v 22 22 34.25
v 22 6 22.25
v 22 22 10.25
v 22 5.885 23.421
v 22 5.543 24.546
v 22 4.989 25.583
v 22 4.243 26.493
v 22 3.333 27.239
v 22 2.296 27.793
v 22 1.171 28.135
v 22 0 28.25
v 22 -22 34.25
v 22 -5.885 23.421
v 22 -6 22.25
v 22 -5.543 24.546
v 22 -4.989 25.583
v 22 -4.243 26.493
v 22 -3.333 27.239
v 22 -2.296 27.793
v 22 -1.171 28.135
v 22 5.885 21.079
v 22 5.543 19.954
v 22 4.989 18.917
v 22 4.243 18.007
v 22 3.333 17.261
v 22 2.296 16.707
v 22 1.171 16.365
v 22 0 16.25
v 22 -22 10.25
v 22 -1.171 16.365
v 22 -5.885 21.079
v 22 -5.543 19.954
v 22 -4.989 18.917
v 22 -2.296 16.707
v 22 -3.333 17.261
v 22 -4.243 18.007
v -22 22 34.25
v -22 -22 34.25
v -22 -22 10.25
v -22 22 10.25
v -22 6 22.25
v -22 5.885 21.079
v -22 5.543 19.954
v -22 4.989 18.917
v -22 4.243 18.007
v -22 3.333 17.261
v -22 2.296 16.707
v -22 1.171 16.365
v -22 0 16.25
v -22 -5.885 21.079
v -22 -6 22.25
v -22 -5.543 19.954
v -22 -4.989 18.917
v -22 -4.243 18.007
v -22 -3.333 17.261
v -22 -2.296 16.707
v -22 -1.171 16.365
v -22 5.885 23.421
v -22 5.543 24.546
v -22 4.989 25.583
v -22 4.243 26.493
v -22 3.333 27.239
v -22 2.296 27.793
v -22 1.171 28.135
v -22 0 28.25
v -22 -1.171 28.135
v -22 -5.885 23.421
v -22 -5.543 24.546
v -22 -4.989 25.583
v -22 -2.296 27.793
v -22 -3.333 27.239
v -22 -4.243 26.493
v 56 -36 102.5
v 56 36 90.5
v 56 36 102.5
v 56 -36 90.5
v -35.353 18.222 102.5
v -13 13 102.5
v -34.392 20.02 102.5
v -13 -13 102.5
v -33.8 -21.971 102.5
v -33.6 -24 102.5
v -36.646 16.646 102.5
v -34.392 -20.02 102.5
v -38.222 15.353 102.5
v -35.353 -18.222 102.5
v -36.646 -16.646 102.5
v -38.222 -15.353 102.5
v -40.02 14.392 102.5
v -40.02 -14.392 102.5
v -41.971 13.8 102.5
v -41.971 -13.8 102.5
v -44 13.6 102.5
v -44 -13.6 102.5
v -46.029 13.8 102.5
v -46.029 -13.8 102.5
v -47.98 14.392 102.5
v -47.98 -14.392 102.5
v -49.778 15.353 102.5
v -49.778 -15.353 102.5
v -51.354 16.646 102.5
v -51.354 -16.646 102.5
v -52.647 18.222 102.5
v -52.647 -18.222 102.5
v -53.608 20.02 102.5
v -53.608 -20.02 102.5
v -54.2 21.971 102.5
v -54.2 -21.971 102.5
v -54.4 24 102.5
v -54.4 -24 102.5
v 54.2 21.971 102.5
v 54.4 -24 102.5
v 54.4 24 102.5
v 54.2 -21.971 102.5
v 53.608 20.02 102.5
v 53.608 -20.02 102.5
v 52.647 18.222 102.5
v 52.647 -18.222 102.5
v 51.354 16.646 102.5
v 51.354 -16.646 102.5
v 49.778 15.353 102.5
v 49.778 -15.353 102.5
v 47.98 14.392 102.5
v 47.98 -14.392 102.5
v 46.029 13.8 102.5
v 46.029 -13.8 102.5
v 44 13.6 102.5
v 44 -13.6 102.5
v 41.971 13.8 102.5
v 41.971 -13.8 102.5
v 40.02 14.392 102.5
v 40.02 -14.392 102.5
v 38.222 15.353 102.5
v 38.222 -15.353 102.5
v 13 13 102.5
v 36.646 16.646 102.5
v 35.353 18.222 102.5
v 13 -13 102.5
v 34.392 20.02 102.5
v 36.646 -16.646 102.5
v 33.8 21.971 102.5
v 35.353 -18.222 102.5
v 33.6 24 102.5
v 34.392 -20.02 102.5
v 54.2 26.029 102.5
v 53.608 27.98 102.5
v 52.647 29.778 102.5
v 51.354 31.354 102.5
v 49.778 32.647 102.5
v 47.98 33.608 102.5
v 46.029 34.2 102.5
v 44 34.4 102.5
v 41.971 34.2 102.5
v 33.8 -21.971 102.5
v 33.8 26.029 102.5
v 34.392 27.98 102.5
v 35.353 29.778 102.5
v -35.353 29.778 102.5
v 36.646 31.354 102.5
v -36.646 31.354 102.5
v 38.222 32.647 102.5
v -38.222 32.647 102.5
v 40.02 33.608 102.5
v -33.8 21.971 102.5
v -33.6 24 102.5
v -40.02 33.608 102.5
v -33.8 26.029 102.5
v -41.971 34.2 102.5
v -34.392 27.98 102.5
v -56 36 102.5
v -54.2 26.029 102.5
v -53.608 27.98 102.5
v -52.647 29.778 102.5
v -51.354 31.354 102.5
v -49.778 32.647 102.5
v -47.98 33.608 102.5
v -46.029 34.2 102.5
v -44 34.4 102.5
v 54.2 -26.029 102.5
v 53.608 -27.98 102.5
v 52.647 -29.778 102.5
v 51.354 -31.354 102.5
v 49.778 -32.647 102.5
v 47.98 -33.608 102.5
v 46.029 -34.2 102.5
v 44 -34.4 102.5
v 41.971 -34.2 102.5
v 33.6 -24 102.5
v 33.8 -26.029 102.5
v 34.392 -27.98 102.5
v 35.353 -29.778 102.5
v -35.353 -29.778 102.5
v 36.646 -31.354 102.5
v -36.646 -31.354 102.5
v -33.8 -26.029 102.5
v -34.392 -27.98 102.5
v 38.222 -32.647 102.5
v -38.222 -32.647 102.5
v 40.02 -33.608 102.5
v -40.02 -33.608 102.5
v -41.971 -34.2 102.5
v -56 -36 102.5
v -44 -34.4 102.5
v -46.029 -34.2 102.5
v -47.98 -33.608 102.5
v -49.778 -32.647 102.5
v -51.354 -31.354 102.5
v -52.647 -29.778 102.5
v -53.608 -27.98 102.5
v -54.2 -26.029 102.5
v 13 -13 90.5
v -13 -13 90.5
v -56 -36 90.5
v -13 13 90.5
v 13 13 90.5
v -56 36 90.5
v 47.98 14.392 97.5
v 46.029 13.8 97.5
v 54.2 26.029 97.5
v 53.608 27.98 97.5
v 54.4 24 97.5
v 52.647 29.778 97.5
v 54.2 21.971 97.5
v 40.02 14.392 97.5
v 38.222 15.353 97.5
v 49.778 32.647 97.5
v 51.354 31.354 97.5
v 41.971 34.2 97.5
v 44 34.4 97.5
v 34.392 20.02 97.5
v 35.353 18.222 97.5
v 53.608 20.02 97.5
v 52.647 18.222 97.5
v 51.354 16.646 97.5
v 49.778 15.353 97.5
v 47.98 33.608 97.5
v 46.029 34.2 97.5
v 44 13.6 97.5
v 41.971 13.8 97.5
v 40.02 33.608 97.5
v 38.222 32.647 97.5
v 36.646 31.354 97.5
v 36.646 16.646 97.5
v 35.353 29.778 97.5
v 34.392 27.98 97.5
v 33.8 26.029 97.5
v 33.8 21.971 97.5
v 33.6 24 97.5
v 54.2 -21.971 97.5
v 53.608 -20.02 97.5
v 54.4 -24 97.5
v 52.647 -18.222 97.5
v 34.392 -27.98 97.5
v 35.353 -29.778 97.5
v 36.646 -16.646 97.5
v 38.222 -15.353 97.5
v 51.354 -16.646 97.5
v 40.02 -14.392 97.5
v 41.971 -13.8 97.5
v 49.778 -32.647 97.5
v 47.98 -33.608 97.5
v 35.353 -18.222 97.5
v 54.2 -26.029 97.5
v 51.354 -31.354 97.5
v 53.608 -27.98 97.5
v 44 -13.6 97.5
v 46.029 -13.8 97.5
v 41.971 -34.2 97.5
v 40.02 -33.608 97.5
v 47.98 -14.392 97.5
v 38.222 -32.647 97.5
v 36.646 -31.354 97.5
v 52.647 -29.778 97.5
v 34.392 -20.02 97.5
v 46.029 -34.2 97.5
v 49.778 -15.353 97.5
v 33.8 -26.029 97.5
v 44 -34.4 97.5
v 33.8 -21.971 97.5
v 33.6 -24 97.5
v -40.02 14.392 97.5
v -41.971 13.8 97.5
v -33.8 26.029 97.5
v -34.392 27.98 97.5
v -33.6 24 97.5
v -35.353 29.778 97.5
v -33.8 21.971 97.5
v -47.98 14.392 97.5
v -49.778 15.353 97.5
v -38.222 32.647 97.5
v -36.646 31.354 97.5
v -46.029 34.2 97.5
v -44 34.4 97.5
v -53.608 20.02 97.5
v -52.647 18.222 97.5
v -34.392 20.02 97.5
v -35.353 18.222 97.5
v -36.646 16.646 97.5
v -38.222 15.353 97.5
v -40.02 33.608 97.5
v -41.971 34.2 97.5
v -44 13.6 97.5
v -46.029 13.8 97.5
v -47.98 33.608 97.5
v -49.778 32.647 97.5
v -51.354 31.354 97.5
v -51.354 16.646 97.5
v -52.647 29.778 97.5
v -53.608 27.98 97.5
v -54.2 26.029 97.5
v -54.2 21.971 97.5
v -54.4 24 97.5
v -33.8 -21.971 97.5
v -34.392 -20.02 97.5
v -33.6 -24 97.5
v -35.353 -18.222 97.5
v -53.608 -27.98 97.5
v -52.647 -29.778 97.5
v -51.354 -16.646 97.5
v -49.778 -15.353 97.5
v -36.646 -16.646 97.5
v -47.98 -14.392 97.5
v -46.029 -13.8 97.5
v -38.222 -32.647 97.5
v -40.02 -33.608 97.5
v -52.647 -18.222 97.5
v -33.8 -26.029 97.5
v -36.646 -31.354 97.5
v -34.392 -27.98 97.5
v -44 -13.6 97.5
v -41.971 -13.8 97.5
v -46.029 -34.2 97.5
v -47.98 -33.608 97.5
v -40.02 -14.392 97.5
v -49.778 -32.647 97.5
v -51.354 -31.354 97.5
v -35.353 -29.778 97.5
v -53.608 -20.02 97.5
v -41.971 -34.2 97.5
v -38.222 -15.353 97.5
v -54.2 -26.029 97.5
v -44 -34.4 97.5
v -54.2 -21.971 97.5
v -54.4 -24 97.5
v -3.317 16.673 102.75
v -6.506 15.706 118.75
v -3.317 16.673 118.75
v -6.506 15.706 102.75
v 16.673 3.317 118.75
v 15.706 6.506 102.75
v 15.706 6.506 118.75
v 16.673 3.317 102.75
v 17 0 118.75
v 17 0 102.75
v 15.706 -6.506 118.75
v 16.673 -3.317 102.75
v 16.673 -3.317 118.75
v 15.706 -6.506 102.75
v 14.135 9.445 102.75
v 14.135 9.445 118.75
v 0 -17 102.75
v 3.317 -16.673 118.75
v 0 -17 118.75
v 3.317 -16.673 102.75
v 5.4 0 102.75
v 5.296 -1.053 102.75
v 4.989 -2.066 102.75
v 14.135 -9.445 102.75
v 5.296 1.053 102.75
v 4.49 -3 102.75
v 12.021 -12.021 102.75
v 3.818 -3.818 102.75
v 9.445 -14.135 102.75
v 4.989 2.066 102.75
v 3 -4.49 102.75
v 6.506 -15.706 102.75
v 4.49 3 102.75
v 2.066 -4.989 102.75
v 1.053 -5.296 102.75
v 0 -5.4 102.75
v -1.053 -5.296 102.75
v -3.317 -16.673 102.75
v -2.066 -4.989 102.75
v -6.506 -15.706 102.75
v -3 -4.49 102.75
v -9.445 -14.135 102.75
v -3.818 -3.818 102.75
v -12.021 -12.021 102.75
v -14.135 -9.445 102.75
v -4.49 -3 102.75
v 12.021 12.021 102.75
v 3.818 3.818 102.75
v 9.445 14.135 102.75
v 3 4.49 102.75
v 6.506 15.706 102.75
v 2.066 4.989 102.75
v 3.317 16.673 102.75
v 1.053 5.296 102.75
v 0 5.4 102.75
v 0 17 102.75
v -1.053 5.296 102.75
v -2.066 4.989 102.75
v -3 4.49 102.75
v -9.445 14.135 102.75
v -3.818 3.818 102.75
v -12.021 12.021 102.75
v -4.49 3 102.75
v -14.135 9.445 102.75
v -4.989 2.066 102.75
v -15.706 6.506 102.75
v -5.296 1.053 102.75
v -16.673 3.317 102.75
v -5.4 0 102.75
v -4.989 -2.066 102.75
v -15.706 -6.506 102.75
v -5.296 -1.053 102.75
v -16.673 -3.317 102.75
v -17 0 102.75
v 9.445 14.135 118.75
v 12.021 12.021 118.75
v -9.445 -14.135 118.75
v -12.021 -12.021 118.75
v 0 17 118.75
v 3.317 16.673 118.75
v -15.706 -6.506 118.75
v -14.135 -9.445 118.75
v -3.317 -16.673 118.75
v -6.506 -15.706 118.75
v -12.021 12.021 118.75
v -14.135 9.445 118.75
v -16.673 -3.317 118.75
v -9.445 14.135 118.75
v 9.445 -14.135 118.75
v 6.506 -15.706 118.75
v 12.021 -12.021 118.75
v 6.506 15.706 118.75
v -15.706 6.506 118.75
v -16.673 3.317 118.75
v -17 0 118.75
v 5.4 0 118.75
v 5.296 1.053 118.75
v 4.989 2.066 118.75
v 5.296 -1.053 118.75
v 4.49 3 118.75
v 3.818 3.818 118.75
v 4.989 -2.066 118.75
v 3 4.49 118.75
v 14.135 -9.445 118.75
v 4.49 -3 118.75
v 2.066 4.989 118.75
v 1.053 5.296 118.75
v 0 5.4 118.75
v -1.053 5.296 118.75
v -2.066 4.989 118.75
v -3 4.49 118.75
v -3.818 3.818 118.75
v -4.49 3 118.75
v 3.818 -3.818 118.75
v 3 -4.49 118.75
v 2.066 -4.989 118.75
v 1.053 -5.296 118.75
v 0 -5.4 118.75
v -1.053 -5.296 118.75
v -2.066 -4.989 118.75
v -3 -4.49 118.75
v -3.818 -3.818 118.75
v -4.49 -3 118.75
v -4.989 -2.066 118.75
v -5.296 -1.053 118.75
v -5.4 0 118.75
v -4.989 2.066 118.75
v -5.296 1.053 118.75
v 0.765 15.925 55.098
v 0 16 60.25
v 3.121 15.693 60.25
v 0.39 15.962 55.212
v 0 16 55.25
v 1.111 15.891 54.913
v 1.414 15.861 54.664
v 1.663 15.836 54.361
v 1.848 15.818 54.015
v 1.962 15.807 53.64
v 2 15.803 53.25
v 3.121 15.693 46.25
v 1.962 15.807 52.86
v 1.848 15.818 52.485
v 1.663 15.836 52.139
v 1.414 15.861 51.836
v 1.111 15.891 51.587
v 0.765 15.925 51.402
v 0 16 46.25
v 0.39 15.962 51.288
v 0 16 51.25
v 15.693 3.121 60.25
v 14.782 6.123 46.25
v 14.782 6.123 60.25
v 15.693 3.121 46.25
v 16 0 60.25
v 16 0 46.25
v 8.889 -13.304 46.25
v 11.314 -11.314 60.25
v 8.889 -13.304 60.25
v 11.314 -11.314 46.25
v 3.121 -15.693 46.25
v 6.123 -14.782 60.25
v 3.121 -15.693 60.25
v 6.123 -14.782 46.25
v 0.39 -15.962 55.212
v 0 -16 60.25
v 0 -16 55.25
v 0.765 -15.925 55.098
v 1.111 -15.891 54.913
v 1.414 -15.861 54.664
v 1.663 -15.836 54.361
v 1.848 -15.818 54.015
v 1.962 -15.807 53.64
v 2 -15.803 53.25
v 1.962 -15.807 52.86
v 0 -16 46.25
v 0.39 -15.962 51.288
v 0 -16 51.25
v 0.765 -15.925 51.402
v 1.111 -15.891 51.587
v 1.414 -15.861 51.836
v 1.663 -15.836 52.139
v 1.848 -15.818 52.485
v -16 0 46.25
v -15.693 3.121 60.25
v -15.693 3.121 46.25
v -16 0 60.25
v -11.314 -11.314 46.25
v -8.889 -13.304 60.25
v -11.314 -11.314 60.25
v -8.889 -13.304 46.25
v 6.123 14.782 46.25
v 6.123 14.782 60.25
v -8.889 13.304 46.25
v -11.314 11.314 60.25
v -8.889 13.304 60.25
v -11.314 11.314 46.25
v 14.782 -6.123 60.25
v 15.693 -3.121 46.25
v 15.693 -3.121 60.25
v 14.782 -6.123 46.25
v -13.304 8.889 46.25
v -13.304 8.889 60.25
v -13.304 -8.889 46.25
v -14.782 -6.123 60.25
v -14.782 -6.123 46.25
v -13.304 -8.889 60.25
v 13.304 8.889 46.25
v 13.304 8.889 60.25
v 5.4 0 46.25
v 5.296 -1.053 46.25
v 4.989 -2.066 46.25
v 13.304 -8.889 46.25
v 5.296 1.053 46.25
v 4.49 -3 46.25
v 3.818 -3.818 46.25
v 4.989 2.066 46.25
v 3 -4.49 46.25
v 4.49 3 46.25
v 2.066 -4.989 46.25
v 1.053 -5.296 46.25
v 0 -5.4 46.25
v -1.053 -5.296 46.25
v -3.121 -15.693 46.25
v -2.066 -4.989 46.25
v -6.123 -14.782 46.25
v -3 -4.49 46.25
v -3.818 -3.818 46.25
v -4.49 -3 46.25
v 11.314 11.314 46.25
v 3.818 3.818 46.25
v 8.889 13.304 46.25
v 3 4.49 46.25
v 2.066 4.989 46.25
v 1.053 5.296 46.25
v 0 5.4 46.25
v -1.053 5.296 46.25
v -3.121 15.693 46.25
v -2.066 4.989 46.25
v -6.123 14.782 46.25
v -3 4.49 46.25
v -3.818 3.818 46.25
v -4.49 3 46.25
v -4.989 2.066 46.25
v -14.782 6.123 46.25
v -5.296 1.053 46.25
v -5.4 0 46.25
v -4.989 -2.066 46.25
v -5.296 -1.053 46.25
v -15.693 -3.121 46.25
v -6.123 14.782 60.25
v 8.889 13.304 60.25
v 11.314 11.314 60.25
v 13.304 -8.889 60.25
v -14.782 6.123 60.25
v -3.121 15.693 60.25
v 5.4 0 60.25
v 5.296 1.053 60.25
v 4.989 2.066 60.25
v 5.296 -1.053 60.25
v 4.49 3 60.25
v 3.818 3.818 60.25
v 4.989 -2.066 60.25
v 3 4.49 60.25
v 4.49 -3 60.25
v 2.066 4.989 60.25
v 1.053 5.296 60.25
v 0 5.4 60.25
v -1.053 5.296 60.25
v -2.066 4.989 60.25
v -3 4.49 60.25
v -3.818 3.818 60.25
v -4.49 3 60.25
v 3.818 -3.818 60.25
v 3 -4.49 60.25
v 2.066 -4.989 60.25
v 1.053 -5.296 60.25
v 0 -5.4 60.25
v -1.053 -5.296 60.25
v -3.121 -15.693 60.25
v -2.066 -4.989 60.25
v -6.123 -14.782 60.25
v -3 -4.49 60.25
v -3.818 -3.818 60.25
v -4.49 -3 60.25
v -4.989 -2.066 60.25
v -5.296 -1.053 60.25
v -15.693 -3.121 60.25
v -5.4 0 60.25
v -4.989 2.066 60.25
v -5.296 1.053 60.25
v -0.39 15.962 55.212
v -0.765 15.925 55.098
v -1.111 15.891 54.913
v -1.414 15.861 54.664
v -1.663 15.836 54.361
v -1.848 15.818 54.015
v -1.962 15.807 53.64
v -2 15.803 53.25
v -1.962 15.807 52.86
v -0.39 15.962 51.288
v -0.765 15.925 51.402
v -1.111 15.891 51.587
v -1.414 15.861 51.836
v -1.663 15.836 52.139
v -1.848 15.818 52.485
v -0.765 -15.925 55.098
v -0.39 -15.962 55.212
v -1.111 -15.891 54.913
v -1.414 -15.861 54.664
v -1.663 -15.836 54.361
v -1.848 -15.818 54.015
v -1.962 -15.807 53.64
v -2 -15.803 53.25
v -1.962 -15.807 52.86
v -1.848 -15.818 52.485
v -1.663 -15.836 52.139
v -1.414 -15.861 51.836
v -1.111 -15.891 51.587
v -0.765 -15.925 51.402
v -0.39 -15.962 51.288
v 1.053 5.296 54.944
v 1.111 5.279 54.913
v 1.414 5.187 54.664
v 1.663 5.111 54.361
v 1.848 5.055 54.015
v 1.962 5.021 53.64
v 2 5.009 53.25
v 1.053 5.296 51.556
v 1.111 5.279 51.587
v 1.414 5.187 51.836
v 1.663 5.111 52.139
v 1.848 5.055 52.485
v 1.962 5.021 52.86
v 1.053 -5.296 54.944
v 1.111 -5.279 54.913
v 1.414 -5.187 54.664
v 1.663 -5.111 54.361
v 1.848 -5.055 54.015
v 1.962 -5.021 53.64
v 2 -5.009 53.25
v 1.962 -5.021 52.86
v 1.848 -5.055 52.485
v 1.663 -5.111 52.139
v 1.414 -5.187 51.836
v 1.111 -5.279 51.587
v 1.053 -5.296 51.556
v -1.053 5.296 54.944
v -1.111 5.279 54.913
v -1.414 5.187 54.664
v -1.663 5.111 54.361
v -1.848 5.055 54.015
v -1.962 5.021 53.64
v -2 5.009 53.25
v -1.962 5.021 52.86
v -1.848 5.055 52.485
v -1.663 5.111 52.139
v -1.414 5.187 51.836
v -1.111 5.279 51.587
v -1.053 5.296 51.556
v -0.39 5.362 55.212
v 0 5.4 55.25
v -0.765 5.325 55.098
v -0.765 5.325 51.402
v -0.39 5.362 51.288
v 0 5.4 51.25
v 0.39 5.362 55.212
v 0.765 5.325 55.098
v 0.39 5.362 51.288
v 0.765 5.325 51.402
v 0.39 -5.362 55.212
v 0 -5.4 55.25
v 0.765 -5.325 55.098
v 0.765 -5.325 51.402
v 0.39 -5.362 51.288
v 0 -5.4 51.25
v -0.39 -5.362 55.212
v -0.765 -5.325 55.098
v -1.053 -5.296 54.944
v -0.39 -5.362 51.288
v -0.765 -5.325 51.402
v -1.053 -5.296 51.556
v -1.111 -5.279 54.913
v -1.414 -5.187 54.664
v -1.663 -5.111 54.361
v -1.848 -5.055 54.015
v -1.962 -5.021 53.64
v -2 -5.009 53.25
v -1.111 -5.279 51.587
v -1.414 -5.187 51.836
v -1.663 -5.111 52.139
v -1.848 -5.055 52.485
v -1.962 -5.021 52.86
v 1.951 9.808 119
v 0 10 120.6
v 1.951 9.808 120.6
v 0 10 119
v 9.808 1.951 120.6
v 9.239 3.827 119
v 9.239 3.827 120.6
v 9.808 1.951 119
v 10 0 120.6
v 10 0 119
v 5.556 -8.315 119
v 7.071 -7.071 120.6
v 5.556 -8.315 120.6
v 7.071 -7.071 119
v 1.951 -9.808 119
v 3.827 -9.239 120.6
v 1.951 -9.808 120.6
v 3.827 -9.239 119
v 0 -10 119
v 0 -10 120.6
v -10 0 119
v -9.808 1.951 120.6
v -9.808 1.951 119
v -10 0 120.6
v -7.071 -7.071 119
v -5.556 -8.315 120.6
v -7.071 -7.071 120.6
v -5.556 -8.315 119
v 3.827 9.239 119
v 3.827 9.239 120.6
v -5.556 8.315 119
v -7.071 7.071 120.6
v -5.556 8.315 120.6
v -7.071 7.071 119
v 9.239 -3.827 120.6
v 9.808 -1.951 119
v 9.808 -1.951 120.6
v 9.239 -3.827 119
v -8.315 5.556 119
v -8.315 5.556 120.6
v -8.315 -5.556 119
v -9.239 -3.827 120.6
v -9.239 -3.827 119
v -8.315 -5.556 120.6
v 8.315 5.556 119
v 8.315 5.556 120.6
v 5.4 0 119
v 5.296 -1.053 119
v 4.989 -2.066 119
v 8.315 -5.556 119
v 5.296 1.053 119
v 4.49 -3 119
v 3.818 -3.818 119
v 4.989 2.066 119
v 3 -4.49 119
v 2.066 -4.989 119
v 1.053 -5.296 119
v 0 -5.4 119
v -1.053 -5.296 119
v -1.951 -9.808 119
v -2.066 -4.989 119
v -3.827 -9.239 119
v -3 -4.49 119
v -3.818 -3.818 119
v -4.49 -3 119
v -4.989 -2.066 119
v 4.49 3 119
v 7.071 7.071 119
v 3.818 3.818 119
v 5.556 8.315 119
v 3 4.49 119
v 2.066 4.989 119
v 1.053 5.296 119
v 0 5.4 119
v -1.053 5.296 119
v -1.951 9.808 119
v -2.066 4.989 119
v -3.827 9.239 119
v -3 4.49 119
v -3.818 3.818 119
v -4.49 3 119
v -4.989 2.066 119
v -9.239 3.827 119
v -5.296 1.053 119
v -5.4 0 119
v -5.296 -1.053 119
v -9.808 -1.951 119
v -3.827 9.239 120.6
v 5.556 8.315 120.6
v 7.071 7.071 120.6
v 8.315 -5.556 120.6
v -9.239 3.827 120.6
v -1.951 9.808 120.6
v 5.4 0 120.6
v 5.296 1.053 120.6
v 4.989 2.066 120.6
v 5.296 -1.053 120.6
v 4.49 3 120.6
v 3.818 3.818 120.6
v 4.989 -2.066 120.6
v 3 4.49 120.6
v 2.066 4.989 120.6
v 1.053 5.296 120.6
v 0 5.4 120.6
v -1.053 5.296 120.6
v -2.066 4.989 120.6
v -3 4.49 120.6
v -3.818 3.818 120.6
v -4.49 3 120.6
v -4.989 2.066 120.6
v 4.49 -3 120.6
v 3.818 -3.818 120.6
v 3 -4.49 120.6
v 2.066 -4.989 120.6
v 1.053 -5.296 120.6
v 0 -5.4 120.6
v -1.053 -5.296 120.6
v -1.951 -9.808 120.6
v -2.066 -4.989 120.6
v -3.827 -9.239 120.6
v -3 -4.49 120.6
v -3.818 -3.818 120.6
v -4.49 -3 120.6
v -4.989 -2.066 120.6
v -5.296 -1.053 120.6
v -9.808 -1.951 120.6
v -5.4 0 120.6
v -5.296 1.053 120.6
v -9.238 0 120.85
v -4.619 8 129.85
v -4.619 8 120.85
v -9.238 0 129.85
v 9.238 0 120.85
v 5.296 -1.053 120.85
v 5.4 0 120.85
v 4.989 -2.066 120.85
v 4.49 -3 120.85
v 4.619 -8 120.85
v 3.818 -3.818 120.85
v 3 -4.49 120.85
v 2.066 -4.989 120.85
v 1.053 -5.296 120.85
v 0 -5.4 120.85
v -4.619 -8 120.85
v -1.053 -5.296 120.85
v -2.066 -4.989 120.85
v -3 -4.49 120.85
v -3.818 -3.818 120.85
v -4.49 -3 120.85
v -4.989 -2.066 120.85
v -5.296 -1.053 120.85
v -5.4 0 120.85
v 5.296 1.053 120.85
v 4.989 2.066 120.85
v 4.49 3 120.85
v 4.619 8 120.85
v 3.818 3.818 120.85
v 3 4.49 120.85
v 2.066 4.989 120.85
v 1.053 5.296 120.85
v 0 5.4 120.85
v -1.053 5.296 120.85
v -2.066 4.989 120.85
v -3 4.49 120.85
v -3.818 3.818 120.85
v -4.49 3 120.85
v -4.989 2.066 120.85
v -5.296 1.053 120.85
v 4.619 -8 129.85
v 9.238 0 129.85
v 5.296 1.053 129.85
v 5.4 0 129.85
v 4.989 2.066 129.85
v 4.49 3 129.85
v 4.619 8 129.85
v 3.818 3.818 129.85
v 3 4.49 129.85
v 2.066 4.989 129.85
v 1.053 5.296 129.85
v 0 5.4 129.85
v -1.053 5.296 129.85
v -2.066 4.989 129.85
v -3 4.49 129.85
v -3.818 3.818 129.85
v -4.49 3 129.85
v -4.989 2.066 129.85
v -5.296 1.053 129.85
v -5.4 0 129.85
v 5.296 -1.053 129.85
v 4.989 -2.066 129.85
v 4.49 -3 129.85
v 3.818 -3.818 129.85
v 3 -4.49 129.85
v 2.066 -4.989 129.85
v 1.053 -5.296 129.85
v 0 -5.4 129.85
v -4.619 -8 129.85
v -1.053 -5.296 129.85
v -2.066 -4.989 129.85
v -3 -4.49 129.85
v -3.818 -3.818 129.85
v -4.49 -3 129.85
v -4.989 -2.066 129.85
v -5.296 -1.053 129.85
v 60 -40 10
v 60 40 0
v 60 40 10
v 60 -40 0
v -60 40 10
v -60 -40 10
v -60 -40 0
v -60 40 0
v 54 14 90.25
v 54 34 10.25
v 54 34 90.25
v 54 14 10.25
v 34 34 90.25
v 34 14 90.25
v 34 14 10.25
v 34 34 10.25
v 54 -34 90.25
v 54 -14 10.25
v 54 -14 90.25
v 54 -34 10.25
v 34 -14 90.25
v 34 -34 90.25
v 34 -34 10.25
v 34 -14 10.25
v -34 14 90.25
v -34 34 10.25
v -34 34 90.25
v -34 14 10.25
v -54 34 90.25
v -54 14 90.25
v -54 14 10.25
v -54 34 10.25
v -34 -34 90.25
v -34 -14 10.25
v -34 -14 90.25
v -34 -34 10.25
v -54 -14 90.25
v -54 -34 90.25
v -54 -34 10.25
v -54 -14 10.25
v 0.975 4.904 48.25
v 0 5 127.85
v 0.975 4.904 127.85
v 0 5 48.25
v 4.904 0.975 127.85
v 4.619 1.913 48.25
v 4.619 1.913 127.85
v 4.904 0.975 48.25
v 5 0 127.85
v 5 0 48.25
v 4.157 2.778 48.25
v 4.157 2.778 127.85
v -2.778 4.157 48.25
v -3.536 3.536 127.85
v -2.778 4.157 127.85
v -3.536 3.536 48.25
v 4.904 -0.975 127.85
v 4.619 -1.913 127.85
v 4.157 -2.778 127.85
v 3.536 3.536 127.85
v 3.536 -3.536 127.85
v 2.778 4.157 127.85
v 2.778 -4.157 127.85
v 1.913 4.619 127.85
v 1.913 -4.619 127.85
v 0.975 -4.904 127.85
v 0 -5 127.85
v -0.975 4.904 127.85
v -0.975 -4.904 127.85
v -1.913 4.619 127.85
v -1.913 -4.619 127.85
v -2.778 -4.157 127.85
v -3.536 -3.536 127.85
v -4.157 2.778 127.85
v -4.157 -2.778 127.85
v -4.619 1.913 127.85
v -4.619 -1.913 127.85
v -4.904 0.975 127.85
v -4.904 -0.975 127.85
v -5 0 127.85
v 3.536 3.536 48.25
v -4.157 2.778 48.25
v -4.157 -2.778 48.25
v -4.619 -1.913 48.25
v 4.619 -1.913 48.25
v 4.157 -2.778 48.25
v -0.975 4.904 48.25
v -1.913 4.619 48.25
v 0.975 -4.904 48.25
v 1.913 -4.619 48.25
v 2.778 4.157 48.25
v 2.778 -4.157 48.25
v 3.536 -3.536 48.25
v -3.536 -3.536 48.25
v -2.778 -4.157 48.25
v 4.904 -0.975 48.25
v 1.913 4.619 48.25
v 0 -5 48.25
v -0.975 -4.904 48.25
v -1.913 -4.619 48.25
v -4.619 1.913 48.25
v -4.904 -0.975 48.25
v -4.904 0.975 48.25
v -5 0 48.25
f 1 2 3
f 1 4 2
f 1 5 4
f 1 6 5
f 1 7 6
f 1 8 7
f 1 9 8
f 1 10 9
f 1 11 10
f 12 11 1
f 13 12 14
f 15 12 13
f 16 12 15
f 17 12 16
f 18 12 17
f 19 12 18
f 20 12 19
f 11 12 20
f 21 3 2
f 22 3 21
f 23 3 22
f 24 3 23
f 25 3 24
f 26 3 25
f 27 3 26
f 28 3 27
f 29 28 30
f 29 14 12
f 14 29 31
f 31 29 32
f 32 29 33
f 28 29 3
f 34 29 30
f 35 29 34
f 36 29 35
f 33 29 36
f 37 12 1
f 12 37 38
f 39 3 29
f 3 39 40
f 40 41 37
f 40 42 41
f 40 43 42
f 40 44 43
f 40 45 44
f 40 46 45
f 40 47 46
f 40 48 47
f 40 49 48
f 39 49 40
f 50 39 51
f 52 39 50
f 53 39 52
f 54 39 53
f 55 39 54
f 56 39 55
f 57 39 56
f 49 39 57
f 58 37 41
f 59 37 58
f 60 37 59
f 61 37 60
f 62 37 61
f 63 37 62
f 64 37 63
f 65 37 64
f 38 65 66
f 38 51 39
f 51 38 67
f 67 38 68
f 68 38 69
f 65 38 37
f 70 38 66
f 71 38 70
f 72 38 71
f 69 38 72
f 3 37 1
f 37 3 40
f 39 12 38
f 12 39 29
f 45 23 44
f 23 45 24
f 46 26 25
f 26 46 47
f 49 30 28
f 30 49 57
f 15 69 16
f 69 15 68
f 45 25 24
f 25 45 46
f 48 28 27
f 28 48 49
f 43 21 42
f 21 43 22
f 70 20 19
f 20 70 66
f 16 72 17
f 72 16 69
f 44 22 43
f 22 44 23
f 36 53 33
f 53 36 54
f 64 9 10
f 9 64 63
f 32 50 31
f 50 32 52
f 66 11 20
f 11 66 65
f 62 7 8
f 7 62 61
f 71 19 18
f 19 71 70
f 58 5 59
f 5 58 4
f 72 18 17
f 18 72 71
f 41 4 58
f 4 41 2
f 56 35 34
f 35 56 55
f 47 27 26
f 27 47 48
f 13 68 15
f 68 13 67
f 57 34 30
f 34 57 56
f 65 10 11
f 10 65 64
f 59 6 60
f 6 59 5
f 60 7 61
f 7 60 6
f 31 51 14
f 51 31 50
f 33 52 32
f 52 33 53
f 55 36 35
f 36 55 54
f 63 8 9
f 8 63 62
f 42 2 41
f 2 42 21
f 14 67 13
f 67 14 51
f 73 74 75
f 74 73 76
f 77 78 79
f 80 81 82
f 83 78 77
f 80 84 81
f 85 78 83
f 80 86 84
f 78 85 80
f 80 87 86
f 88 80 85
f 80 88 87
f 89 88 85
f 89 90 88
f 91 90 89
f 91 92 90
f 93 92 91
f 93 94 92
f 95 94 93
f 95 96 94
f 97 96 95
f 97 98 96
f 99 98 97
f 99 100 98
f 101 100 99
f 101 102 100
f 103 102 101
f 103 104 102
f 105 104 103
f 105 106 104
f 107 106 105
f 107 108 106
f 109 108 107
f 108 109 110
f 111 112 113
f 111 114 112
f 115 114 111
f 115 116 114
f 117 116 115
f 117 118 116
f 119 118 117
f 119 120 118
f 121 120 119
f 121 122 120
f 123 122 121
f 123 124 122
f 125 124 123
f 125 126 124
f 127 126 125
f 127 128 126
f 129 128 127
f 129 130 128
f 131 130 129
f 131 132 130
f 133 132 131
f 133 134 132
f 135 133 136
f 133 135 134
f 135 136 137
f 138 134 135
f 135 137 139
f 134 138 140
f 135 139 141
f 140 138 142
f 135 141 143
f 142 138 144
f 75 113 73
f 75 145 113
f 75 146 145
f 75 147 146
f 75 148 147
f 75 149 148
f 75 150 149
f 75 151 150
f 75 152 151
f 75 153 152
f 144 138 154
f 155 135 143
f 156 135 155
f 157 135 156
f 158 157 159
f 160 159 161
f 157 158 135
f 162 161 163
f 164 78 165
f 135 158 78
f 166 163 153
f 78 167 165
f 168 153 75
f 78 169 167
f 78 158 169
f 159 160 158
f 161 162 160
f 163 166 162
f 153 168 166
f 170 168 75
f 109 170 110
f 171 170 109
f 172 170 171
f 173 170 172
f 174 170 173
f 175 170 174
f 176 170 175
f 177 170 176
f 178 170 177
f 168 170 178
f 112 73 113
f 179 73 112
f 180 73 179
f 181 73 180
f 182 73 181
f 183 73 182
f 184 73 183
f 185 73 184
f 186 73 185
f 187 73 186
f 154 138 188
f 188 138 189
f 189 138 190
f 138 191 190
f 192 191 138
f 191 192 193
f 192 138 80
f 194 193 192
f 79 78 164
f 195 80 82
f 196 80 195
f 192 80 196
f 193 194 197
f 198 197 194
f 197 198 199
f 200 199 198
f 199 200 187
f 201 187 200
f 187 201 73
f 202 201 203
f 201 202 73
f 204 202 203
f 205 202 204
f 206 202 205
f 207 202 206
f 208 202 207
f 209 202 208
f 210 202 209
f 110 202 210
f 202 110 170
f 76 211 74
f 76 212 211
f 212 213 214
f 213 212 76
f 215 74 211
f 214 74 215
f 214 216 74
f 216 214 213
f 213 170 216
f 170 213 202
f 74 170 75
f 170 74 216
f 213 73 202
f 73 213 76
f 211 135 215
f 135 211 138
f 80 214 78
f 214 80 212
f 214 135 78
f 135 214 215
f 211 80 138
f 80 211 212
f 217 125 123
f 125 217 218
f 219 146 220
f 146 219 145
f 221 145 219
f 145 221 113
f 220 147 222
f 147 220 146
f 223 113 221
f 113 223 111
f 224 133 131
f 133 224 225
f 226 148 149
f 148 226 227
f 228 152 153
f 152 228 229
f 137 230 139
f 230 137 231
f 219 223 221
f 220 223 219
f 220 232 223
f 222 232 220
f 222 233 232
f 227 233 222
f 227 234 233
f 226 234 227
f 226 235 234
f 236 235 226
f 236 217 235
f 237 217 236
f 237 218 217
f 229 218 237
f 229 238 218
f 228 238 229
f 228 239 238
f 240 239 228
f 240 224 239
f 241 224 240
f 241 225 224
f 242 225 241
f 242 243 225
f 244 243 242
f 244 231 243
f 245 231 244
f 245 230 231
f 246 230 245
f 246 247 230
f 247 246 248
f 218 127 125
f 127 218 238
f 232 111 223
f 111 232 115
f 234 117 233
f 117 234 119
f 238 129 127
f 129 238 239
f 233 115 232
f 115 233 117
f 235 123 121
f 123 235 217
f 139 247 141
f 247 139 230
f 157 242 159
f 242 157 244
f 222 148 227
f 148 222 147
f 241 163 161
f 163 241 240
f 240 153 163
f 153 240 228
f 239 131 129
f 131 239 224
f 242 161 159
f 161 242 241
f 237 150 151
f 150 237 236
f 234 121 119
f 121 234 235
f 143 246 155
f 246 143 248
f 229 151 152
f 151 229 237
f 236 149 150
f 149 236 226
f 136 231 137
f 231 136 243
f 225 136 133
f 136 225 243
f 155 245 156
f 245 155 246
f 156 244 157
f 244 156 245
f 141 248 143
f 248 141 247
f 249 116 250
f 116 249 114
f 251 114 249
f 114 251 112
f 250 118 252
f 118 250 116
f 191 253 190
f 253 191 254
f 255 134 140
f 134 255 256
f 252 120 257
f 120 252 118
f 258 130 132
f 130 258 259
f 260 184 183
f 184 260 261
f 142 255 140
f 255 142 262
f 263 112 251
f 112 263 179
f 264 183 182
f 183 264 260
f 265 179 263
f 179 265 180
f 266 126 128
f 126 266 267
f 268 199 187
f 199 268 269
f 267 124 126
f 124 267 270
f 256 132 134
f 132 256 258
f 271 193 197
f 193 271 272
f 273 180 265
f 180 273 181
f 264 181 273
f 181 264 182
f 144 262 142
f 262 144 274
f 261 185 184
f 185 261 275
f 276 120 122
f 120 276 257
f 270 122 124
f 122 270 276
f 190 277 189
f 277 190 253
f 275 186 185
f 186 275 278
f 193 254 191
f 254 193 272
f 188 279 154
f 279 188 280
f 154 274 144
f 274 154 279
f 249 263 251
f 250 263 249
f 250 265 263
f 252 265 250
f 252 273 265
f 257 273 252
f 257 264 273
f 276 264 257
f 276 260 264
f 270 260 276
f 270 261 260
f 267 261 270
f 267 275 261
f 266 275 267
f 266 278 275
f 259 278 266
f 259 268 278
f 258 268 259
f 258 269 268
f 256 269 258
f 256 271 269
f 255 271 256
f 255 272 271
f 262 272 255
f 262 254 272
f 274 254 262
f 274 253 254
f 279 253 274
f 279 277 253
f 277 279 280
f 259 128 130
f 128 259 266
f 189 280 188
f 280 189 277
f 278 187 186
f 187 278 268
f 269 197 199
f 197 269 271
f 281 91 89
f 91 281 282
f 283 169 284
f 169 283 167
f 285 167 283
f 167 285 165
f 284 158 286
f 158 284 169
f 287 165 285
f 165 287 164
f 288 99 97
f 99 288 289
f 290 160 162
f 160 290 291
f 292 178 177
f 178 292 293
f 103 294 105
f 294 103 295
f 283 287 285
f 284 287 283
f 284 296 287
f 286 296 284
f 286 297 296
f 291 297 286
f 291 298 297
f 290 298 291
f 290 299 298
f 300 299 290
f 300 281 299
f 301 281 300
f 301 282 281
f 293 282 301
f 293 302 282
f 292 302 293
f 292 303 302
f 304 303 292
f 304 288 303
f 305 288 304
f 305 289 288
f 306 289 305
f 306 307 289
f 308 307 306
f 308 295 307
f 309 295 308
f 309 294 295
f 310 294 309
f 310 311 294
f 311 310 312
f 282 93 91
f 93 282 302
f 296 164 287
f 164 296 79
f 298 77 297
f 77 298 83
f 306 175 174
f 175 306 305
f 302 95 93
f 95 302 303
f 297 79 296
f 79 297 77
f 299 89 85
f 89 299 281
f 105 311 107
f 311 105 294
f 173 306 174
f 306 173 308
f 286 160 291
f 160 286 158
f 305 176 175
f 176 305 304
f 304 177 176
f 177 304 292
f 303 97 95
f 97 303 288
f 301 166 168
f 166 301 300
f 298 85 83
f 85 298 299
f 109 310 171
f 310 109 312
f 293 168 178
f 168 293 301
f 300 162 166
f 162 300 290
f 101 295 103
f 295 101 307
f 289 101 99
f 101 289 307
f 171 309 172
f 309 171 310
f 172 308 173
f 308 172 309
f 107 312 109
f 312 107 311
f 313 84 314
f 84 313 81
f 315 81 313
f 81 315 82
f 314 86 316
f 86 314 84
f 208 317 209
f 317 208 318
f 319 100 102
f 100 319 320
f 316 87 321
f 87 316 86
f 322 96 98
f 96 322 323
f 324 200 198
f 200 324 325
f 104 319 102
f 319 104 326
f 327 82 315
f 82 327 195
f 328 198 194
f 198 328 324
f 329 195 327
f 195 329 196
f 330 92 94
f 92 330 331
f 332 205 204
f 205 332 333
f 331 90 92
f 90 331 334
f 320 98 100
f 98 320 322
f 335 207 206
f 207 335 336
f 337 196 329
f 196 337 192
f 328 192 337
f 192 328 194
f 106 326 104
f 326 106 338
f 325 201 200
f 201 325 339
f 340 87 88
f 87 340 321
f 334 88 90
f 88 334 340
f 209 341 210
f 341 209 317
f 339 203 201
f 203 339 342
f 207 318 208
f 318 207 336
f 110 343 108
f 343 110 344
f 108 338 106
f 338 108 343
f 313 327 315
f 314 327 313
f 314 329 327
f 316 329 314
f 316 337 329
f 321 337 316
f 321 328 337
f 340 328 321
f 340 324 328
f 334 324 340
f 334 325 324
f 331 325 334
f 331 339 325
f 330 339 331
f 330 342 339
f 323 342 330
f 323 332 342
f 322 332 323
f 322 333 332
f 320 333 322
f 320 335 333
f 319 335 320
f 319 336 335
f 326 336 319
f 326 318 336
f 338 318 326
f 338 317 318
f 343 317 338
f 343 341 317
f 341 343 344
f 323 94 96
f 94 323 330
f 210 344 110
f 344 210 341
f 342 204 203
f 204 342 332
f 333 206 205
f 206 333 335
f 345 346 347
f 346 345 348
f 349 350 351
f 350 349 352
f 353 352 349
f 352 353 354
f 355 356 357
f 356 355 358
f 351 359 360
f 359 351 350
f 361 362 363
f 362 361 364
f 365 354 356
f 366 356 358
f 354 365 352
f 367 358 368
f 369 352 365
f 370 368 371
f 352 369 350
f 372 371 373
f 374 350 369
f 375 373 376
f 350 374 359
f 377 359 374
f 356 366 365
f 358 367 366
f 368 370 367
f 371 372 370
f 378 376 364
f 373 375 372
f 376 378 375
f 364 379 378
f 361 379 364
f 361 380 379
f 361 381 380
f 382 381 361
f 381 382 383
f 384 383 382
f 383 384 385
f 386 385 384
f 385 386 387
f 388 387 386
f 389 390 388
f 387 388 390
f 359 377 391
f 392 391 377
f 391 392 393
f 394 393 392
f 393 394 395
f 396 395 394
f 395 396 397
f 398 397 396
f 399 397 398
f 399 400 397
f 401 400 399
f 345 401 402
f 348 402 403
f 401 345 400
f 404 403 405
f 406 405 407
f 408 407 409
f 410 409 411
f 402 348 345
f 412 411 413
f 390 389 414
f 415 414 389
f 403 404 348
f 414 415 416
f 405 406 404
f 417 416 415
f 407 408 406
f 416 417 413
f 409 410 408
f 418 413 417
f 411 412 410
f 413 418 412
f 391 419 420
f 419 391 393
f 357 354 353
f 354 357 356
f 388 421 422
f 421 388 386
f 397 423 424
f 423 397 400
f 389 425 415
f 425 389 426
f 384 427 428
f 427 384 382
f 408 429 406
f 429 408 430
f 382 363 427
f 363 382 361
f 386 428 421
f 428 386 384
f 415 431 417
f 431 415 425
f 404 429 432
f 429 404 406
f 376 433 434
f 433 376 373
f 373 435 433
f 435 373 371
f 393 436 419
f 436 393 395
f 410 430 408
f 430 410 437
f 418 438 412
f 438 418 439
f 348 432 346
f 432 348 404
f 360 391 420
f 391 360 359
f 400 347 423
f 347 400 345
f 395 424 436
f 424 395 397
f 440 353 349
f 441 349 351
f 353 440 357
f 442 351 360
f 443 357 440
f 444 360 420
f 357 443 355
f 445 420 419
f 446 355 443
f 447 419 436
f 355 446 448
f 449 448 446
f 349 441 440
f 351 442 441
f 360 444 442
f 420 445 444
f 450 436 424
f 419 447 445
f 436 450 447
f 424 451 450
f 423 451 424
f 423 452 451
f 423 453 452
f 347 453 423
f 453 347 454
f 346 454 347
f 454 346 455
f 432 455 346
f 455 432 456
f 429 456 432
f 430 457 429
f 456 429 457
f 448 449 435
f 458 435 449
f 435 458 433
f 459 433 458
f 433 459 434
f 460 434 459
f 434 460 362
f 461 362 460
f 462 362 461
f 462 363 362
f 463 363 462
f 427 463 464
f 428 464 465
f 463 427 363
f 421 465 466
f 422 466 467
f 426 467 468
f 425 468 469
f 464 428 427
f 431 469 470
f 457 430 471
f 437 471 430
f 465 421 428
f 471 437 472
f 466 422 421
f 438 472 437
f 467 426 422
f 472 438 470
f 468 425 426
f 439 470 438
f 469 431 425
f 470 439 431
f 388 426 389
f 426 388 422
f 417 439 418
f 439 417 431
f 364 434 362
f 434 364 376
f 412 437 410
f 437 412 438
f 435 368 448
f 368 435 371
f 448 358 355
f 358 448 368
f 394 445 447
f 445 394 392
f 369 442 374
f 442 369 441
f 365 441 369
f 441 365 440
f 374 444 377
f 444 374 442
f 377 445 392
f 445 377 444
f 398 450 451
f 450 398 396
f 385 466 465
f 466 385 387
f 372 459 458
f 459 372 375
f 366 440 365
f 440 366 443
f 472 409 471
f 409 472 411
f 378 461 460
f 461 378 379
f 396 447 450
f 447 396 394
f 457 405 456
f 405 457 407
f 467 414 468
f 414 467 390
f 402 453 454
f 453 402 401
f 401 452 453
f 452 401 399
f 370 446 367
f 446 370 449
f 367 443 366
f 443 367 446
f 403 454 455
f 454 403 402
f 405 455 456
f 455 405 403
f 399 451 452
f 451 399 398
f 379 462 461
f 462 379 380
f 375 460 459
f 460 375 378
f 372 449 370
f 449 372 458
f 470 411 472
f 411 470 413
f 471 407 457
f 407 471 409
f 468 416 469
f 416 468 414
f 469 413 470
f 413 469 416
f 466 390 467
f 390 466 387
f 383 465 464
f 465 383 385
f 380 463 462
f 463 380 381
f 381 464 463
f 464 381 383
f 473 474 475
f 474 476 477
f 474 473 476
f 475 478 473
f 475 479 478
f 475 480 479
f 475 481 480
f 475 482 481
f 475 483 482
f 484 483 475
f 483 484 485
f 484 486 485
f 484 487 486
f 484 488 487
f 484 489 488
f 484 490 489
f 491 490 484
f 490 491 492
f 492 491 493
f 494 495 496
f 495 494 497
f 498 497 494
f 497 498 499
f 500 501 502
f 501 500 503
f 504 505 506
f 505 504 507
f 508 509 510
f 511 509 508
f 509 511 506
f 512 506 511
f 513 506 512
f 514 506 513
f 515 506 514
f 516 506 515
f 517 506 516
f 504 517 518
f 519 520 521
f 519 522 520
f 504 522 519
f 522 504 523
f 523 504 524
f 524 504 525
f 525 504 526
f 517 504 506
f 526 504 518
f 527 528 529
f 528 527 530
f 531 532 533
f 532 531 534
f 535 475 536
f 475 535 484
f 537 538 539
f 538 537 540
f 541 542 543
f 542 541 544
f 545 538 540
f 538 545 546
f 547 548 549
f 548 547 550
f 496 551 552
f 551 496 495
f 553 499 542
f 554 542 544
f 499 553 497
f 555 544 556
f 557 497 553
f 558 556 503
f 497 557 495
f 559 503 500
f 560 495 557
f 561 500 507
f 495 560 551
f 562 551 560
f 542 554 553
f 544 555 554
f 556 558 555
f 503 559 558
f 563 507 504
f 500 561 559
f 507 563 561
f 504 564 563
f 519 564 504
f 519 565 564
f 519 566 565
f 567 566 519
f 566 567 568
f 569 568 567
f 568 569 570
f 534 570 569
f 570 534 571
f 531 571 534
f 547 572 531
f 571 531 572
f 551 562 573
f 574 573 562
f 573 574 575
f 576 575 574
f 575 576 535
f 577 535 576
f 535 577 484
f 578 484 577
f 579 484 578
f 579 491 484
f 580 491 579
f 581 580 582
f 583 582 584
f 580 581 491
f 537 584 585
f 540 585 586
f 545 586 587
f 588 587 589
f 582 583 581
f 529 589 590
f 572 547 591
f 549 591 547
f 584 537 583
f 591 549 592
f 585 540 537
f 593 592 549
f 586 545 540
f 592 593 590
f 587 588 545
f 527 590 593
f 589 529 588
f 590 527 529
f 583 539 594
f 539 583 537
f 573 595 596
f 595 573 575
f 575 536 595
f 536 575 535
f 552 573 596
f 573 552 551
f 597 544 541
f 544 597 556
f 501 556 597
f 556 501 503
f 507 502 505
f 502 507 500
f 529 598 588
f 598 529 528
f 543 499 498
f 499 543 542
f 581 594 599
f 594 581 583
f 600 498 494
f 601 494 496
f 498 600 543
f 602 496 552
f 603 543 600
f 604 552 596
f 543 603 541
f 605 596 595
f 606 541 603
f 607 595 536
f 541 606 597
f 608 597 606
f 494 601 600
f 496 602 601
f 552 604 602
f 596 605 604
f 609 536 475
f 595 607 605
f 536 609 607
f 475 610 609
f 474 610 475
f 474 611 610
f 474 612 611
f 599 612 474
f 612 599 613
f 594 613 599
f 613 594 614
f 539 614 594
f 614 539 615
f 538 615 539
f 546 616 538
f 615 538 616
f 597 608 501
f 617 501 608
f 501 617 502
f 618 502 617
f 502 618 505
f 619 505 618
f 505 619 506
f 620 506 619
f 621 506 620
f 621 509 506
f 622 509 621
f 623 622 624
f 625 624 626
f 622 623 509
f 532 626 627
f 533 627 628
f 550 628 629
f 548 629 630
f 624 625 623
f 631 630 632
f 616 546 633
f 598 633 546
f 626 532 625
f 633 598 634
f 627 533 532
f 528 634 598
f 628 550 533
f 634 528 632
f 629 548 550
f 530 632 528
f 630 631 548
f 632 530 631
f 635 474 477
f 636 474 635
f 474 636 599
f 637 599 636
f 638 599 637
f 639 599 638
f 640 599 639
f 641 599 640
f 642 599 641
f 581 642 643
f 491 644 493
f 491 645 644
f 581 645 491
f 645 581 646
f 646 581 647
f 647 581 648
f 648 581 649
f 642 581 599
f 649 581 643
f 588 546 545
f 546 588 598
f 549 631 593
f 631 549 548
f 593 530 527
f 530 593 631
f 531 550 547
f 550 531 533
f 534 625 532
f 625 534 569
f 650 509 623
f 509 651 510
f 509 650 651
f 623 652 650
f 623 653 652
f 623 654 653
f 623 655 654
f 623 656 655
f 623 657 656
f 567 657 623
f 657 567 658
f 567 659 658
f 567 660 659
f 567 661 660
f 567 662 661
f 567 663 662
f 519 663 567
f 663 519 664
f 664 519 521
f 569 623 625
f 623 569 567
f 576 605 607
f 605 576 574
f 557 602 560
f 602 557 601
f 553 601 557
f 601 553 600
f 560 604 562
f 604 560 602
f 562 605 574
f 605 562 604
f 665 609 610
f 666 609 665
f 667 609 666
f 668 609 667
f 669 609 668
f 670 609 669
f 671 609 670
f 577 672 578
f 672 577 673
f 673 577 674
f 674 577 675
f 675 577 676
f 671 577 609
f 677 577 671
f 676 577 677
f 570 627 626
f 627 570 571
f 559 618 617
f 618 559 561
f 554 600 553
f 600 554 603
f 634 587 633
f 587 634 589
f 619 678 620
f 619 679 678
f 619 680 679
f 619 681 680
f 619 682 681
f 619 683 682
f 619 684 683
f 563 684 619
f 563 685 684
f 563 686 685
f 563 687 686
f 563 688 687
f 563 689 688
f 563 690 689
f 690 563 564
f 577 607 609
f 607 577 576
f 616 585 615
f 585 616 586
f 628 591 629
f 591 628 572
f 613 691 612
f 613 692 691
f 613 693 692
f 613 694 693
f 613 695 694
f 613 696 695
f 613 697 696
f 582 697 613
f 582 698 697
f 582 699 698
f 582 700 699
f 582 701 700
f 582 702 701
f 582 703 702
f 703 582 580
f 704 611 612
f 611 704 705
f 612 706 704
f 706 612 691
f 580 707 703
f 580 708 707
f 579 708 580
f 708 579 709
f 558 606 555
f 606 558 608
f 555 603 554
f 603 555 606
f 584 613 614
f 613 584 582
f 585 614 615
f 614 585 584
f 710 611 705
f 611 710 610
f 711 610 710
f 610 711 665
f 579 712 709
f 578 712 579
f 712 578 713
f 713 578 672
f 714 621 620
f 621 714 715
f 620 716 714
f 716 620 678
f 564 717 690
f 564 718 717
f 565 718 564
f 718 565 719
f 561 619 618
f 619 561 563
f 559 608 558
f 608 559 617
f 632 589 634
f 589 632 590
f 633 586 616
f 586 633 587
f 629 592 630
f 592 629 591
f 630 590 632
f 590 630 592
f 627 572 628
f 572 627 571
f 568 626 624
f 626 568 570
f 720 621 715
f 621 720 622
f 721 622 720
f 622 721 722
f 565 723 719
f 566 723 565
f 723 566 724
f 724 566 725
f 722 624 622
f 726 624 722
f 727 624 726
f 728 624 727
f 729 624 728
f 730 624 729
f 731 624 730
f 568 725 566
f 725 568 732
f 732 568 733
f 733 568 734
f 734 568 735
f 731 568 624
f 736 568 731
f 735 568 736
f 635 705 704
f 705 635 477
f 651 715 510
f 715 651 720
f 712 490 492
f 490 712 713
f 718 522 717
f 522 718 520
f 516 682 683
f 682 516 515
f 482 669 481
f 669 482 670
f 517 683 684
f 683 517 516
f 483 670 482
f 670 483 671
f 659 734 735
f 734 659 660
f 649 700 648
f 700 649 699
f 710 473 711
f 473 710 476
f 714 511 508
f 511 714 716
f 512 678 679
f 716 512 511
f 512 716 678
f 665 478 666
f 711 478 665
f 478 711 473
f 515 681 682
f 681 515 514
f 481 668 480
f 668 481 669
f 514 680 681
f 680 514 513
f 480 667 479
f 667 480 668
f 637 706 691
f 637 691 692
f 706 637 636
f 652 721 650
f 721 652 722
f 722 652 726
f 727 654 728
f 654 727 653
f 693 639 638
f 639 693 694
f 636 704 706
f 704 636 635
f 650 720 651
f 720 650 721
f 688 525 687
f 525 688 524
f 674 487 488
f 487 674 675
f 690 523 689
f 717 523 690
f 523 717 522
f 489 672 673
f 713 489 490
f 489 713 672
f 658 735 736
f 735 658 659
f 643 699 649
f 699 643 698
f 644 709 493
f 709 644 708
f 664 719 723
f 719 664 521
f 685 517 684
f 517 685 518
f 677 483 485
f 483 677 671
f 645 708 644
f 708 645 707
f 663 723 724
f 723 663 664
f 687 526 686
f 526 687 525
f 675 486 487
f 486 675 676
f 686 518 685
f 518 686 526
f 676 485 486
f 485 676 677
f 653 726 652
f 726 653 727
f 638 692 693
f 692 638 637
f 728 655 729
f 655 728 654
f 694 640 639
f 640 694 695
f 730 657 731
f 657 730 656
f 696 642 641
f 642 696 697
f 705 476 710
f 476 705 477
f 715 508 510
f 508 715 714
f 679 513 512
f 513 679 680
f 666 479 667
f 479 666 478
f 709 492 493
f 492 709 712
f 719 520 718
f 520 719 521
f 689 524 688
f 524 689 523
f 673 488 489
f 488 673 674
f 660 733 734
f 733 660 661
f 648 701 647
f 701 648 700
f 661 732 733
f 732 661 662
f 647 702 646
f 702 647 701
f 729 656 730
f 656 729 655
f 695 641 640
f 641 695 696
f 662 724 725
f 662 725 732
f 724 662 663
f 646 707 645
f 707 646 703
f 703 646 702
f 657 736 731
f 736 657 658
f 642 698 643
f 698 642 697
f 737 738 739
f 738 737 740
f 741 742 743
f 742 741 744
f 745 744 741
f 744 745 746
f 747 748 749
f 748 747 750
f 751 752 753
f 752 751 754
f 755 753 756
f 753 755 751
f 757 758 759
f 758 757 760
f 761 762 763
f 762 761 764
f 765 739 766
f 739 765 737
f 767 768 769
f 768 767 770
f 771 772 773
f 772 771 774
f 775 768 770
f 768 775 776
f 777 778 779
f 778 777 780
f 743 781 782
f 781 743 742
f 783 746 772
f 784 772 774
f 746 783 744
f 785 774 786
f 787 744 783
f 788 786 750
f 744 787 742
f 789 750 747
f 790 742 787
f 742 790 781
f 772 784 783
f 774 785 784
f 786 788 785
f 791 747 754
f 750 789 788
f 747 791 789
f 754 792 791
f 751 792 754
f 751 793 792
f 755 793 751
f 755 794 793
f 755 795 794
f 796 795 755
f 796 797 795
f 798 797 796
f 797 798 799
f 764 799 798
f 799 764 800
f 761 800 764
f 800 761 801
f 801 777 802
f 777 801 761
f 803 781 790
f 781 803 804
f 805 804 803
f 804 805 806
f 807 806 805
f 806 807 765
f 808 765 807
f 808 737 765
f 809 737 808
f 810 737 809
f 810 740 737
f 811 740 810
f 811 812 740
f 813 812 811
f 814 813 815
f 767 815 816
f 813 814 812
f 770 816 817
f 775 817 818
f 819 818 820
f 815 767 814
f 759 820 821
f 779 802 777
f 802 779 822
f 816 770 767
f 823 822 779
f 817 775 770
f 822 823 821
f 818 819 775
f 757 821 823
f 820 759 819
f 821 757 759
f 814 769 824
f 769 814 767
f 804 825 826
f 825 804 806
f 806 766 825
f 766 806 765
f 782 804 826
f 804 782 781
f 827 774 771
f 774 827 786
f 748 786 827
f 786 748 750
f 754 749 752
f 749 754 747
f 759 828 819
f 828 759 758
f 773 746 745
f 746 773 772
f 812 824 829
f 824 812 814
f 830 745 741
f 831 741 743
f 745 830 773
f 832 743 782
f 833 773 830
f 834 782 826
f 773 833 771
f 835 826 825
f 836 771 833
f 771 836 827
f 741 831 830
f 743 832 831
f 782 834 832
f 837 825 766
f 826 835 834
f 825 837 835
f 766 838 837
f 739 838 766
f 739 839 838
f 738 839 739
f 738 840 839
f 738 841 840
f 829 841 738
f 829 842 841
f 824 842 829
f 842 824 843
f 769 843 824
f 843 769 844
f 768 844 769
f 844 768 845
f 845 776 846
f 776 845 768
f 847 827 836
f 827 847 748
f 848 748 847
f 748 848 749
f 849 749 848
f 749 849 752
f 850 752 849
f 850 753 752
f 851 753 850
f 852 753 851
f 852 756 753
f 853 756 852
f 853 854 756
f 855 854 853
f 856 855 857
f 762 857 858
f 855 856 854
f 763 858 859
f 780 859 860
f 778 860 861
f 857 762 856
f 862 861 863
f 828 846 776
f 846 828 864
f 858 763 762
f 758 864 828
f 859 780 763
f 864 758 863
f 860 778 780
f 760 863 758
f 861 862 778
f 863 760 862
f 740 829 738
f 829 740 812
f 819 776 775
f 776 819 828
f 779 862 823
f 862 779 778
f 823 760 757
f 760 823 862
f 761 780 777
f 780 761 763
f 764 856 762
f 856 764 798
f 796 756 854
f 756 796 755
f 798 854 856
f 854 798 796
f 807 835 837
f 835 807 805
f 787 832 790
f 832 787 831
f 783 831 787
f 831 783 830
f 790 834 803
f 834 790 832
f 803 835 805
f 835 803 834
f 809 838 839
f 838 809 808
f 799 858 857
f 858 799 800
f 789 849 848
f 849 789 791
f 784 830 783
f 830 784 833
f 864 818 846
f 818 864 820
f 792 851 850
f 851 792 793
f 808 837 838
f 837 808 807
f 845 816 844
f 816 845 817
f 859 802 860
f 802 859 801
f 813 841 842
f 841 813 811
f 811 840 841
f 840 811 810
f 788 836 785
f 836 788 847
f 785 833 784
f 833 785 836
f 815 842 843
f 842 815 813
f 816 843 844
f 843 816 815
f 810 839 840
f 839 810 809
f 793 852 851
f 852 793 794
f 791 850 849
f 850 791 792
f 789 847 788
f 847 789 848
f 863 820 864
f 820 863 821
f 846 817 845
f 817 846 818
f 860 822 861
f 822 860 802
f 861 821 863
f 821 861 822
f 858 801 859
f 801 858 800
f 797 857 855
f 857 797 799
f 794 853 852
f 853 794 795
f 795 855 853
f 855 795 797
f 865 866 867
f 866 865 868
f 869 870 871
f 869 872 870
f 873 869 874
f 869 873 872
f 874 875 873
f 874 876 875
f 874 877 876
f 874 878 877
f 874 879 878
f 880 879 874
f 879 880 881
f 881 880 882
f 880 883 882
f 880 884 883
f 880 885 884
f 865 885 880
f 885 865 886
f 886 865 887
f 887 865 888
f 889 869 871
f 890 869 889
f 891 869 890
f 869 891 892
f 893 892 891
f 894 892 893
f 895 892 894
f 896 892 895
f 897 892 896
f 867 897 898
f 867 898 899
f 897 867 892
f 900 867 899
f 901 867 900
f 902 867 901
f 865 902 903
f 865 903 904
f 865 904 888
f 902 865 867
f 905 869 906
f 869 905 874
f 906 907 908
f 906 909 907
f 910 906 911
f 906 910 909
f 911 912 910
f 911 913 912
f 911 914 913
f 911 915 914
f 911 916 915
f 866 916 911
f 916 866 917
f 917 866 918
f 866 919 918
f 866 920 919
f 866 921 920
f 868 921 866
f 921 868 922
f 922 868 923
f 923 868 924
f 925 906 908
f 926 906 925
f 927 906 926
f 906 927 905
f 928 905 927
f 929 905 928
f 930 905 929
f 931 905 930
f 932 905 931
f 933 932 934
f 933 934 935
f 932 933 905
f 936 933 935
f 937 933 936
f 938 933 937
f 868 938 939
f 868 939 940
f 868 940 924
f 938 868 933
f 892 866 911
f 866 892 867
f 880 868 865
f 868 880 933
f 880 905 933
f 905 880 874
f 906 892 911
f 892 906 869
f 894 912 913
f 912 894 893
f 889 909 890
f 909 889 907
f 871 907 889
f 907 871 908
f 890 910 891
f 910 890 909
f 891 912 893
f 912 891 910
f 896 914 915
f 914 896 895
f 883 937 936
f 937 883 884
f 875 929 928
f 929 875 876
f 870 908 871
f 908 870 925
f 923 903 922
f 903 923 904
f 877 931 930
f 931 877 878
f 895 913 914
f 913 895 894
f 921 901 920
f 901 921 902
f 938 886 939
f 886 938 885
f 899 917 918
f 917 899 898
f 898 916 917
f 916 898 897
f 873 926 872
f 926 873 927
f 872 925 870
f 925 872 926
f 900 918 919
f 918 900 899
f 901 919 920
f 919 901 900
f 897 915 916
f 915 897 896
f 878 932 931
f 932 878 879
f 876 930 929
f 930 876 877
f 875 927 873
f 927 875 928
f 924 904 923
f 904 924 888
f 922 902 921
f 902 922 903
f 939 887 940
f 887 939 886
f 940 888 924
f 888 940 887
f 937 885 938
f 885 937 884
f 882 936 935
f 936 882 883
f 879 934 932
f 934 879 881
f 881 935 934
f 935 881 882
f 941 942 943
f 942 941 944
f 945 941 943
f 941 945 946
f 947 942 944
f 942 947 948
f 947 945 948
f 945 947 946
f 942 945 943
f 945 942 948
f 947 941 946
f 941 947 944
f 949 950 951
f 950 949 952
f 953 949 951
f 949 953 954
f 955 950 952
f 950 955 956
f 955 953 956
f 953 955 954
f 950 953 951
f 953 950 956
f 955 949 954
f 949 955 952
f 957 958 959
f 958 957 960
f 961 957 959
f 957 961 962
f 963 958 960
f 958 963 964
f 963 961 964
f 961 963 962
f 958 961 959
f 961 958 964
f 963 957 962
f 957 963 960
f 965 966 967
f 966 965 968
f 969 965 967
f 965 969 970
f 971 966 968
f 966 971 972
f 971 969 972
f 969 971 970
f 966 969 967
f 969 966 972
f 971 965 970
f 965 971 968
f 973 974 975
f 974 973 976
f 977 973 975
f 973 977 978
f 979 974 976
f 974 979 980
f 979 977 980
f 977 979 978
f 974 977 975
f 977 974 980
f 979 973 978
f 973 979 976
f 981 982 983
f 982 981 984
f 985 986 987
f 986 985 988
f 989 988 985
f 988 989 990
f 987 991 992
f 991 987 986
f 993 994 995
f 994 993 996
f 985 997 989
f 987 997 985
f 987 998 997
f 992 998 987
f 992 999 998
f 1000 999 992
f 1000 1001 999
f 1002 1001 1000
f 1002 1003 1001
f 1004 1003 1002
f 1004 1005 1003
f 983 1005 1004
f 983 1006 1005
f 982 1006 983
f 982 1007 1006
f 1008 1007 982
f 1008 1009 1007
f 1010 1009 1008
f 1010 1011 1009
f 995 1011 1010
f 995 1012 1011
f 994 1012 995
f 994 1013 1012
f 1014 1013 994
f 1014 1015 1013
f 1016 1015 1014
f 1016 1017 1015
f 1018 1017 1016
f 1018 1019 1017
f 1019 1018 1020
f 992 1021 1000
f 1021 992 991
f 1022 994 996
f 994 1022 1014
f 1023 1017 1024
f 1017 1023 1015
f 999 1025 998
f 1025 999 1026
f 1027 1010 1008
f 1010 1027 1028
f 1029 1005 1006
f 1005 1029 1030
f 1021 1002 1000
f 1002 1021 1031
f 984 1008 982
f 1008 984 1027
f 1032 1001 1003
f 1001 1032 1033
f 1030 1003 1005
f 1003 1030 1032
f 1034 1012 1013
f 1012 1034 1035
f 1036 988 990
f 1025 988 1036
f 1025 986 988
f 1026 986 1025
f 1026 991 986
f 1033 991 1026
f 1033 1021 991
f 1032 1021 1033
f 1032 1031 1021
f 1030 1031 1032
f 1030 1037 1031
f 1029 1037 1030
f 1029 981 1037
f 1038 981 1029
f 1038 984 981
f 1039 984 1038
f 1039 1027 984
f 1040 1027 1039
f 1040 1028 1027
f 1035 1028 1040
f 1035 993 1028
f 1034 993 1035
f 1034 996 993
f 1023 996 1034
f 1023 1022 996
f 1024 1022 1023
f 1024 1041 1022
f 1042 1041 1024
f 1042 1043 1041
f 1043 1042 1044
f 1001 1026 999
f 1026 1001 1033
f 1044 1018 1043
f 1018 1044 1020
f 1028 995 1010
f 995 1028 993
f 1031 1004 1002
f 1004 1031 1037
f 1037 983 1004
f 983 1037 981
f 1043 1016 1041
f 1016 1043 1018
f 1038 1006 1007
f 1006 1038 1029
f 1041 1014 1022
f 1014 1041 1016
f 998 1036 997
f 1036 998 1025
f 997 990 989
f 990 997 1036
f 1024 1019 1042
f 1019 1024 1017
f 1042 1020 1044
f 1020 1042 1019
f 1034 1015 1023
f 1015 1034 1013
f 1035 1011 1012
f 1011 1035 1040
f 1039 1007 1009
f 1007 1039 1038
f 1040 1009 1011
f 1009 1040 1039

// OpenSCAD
$fn = 32;

// ------------------------------------------------------------------------
// Arbor press fixture: screw d10, posts 80 mm, gap 12 mm
// Every part is its own module, assembly() places every instance.
// ------------------------------------------------------------------------

// --- part 1 ---
module press_bed() {
  difference() {
    translate([-60, -40, 0]) cube([120, 80, 10]);
  }
}

// --- part 2 ---
module anvil_block() {
  difference() {
    translate([-22, -22, 0]) cube([44, 44, 24]);
    translate([0, 0, 12]) rotate([0, 90, 0]) cylinder(h = 46, d = 12, center = true);
  }
}

// --- part 3 ---
module press_post_a() {
  translate([-10, -10, 0]) cube([20, 20, 80]);
}

// --- part 4 ---
module press_post_b() {
  translate([-10, -10, 0]) cube([20, 20, 80]);
}

// --- part 5 ---
module press_post_c() {
  translate([-10, -10, 0]) cube([20, 20, 80]);
}

// --- part 6 ---
module press_post_d() {
  translate([-10, -10, 0]) cube([20, 20, 80]);
}

// --- part 7 ---
module press_frame() {
  difference() {
    translate([-56, -36, 0]) cube([112, 72, 12]);
    translate([-13, -13, -1]) cube([26, 26, 14]);
    translate([44, 24, 7]) cylinder(h = 6, d = 20.8);
    translate([44, -24, 7]) cylinder(h = 6, d = 20.8);
    translate([-44, 24, 7]) cylinder(h = 6, d = 20.8);
    translate([-44, -24, 7]) cylinder(h = 6, d = 20.8);
  }
}

// --- part 8 ---
module guide_ring() {
  difference() {
      translate([0, 0, 0]) cylinder(h = 16, d = 34);
      translate([0, 0, -1]) cylinder(h = 18, d = 10.8);
    }
}

// --- part 9 ---
module press_screw() {
  translate([0, 0, -39.8]) cylinder(h = 79.6, d = 10);
}

// --- part 10 ---
module press_head() {
  difference() {
    cylinder(h = 14, d = 32);
    translate([0, 0, -1]) cylinder(h = 16, d = 10.8);
    translate([0, 0, 7]) rotate([90, 0, 0]) cylinder(h = 34, d = 4, center = true);
  }
}

// --- part 11 ---
module nut_washer() {
  difference() {
      translate([0, 0, 0]) cylinder(h = 1.6, d = 20);
      translate([0, 0, -1]) cylinder(h = 3.6, d = 10.8);
    }
}

// --- part 12 ---
module press_nut() {
  difference() {
    linear_extrude(height = 9) polygon(points = [[9.238, 0], [4.619, 8], [-4.619, 8], [-9.238, 0], [-4.619, -8], [4.619, -8]]);
    translate([0, 0, -1]) cylinder(h = 11, d = 10.8);
  }
}

// --- assembly ---
module assembly() {
  color([0.80, 0.24, 0.20]) translate([0, 0, 0]) rotate([0, 0, 0]) press_bed();
  color([0.20, 0.45, 0.75]) translate([0, 0, 10.25]) rotate([0, 0, 0]) anvil_block();
  color([0.25, 0.62, 0.32]) translate([44, 24, 10.25]) rotate([0, 0, 0]) press_post_a();
  color([0.92, 0.70, 0.18]) translate([44, -24, 10.25]) rotate([0, 0, 0]) press_post_b();
  color([0.58, 0.35, 0.70]) translate([-44, 24, 10.25]) rotate([0, 0, 0]) press_post_c();
  color([0.16, 0.66, 0.66]) translate([-44, -24, 10.25]) rotate([0, 0, 0]) press_post_d();
  color([0.85, 0.48, 0.18]) translate([0, 0, 90.5]) rotate([0, 0, 0]) press_frame();
  color([0.55, 0.60, 0.65]) translate([0, 0, 102.75]) rotate([0, 0, 0]) guide_ring();
  color([0.75, 0.30, 0.55]) translate([0, 0, 88.05]) rotate([0, 0, 0]) press_screw();
  color([0.42, 0.52, 0.28]) translate([0, 0, 46.25]) rotate([0, 0, 0]) press_head();
  color([0.80, 0.24, 0.20]) translate([0, 0, 119]) rotate([0, 0, 0]) nut_washer();
  color([0.20, 0.45, 0.75]) translate([0, 0, 120.85]) rotate([0, 0, 0]) press_nut();
}

assembly();
